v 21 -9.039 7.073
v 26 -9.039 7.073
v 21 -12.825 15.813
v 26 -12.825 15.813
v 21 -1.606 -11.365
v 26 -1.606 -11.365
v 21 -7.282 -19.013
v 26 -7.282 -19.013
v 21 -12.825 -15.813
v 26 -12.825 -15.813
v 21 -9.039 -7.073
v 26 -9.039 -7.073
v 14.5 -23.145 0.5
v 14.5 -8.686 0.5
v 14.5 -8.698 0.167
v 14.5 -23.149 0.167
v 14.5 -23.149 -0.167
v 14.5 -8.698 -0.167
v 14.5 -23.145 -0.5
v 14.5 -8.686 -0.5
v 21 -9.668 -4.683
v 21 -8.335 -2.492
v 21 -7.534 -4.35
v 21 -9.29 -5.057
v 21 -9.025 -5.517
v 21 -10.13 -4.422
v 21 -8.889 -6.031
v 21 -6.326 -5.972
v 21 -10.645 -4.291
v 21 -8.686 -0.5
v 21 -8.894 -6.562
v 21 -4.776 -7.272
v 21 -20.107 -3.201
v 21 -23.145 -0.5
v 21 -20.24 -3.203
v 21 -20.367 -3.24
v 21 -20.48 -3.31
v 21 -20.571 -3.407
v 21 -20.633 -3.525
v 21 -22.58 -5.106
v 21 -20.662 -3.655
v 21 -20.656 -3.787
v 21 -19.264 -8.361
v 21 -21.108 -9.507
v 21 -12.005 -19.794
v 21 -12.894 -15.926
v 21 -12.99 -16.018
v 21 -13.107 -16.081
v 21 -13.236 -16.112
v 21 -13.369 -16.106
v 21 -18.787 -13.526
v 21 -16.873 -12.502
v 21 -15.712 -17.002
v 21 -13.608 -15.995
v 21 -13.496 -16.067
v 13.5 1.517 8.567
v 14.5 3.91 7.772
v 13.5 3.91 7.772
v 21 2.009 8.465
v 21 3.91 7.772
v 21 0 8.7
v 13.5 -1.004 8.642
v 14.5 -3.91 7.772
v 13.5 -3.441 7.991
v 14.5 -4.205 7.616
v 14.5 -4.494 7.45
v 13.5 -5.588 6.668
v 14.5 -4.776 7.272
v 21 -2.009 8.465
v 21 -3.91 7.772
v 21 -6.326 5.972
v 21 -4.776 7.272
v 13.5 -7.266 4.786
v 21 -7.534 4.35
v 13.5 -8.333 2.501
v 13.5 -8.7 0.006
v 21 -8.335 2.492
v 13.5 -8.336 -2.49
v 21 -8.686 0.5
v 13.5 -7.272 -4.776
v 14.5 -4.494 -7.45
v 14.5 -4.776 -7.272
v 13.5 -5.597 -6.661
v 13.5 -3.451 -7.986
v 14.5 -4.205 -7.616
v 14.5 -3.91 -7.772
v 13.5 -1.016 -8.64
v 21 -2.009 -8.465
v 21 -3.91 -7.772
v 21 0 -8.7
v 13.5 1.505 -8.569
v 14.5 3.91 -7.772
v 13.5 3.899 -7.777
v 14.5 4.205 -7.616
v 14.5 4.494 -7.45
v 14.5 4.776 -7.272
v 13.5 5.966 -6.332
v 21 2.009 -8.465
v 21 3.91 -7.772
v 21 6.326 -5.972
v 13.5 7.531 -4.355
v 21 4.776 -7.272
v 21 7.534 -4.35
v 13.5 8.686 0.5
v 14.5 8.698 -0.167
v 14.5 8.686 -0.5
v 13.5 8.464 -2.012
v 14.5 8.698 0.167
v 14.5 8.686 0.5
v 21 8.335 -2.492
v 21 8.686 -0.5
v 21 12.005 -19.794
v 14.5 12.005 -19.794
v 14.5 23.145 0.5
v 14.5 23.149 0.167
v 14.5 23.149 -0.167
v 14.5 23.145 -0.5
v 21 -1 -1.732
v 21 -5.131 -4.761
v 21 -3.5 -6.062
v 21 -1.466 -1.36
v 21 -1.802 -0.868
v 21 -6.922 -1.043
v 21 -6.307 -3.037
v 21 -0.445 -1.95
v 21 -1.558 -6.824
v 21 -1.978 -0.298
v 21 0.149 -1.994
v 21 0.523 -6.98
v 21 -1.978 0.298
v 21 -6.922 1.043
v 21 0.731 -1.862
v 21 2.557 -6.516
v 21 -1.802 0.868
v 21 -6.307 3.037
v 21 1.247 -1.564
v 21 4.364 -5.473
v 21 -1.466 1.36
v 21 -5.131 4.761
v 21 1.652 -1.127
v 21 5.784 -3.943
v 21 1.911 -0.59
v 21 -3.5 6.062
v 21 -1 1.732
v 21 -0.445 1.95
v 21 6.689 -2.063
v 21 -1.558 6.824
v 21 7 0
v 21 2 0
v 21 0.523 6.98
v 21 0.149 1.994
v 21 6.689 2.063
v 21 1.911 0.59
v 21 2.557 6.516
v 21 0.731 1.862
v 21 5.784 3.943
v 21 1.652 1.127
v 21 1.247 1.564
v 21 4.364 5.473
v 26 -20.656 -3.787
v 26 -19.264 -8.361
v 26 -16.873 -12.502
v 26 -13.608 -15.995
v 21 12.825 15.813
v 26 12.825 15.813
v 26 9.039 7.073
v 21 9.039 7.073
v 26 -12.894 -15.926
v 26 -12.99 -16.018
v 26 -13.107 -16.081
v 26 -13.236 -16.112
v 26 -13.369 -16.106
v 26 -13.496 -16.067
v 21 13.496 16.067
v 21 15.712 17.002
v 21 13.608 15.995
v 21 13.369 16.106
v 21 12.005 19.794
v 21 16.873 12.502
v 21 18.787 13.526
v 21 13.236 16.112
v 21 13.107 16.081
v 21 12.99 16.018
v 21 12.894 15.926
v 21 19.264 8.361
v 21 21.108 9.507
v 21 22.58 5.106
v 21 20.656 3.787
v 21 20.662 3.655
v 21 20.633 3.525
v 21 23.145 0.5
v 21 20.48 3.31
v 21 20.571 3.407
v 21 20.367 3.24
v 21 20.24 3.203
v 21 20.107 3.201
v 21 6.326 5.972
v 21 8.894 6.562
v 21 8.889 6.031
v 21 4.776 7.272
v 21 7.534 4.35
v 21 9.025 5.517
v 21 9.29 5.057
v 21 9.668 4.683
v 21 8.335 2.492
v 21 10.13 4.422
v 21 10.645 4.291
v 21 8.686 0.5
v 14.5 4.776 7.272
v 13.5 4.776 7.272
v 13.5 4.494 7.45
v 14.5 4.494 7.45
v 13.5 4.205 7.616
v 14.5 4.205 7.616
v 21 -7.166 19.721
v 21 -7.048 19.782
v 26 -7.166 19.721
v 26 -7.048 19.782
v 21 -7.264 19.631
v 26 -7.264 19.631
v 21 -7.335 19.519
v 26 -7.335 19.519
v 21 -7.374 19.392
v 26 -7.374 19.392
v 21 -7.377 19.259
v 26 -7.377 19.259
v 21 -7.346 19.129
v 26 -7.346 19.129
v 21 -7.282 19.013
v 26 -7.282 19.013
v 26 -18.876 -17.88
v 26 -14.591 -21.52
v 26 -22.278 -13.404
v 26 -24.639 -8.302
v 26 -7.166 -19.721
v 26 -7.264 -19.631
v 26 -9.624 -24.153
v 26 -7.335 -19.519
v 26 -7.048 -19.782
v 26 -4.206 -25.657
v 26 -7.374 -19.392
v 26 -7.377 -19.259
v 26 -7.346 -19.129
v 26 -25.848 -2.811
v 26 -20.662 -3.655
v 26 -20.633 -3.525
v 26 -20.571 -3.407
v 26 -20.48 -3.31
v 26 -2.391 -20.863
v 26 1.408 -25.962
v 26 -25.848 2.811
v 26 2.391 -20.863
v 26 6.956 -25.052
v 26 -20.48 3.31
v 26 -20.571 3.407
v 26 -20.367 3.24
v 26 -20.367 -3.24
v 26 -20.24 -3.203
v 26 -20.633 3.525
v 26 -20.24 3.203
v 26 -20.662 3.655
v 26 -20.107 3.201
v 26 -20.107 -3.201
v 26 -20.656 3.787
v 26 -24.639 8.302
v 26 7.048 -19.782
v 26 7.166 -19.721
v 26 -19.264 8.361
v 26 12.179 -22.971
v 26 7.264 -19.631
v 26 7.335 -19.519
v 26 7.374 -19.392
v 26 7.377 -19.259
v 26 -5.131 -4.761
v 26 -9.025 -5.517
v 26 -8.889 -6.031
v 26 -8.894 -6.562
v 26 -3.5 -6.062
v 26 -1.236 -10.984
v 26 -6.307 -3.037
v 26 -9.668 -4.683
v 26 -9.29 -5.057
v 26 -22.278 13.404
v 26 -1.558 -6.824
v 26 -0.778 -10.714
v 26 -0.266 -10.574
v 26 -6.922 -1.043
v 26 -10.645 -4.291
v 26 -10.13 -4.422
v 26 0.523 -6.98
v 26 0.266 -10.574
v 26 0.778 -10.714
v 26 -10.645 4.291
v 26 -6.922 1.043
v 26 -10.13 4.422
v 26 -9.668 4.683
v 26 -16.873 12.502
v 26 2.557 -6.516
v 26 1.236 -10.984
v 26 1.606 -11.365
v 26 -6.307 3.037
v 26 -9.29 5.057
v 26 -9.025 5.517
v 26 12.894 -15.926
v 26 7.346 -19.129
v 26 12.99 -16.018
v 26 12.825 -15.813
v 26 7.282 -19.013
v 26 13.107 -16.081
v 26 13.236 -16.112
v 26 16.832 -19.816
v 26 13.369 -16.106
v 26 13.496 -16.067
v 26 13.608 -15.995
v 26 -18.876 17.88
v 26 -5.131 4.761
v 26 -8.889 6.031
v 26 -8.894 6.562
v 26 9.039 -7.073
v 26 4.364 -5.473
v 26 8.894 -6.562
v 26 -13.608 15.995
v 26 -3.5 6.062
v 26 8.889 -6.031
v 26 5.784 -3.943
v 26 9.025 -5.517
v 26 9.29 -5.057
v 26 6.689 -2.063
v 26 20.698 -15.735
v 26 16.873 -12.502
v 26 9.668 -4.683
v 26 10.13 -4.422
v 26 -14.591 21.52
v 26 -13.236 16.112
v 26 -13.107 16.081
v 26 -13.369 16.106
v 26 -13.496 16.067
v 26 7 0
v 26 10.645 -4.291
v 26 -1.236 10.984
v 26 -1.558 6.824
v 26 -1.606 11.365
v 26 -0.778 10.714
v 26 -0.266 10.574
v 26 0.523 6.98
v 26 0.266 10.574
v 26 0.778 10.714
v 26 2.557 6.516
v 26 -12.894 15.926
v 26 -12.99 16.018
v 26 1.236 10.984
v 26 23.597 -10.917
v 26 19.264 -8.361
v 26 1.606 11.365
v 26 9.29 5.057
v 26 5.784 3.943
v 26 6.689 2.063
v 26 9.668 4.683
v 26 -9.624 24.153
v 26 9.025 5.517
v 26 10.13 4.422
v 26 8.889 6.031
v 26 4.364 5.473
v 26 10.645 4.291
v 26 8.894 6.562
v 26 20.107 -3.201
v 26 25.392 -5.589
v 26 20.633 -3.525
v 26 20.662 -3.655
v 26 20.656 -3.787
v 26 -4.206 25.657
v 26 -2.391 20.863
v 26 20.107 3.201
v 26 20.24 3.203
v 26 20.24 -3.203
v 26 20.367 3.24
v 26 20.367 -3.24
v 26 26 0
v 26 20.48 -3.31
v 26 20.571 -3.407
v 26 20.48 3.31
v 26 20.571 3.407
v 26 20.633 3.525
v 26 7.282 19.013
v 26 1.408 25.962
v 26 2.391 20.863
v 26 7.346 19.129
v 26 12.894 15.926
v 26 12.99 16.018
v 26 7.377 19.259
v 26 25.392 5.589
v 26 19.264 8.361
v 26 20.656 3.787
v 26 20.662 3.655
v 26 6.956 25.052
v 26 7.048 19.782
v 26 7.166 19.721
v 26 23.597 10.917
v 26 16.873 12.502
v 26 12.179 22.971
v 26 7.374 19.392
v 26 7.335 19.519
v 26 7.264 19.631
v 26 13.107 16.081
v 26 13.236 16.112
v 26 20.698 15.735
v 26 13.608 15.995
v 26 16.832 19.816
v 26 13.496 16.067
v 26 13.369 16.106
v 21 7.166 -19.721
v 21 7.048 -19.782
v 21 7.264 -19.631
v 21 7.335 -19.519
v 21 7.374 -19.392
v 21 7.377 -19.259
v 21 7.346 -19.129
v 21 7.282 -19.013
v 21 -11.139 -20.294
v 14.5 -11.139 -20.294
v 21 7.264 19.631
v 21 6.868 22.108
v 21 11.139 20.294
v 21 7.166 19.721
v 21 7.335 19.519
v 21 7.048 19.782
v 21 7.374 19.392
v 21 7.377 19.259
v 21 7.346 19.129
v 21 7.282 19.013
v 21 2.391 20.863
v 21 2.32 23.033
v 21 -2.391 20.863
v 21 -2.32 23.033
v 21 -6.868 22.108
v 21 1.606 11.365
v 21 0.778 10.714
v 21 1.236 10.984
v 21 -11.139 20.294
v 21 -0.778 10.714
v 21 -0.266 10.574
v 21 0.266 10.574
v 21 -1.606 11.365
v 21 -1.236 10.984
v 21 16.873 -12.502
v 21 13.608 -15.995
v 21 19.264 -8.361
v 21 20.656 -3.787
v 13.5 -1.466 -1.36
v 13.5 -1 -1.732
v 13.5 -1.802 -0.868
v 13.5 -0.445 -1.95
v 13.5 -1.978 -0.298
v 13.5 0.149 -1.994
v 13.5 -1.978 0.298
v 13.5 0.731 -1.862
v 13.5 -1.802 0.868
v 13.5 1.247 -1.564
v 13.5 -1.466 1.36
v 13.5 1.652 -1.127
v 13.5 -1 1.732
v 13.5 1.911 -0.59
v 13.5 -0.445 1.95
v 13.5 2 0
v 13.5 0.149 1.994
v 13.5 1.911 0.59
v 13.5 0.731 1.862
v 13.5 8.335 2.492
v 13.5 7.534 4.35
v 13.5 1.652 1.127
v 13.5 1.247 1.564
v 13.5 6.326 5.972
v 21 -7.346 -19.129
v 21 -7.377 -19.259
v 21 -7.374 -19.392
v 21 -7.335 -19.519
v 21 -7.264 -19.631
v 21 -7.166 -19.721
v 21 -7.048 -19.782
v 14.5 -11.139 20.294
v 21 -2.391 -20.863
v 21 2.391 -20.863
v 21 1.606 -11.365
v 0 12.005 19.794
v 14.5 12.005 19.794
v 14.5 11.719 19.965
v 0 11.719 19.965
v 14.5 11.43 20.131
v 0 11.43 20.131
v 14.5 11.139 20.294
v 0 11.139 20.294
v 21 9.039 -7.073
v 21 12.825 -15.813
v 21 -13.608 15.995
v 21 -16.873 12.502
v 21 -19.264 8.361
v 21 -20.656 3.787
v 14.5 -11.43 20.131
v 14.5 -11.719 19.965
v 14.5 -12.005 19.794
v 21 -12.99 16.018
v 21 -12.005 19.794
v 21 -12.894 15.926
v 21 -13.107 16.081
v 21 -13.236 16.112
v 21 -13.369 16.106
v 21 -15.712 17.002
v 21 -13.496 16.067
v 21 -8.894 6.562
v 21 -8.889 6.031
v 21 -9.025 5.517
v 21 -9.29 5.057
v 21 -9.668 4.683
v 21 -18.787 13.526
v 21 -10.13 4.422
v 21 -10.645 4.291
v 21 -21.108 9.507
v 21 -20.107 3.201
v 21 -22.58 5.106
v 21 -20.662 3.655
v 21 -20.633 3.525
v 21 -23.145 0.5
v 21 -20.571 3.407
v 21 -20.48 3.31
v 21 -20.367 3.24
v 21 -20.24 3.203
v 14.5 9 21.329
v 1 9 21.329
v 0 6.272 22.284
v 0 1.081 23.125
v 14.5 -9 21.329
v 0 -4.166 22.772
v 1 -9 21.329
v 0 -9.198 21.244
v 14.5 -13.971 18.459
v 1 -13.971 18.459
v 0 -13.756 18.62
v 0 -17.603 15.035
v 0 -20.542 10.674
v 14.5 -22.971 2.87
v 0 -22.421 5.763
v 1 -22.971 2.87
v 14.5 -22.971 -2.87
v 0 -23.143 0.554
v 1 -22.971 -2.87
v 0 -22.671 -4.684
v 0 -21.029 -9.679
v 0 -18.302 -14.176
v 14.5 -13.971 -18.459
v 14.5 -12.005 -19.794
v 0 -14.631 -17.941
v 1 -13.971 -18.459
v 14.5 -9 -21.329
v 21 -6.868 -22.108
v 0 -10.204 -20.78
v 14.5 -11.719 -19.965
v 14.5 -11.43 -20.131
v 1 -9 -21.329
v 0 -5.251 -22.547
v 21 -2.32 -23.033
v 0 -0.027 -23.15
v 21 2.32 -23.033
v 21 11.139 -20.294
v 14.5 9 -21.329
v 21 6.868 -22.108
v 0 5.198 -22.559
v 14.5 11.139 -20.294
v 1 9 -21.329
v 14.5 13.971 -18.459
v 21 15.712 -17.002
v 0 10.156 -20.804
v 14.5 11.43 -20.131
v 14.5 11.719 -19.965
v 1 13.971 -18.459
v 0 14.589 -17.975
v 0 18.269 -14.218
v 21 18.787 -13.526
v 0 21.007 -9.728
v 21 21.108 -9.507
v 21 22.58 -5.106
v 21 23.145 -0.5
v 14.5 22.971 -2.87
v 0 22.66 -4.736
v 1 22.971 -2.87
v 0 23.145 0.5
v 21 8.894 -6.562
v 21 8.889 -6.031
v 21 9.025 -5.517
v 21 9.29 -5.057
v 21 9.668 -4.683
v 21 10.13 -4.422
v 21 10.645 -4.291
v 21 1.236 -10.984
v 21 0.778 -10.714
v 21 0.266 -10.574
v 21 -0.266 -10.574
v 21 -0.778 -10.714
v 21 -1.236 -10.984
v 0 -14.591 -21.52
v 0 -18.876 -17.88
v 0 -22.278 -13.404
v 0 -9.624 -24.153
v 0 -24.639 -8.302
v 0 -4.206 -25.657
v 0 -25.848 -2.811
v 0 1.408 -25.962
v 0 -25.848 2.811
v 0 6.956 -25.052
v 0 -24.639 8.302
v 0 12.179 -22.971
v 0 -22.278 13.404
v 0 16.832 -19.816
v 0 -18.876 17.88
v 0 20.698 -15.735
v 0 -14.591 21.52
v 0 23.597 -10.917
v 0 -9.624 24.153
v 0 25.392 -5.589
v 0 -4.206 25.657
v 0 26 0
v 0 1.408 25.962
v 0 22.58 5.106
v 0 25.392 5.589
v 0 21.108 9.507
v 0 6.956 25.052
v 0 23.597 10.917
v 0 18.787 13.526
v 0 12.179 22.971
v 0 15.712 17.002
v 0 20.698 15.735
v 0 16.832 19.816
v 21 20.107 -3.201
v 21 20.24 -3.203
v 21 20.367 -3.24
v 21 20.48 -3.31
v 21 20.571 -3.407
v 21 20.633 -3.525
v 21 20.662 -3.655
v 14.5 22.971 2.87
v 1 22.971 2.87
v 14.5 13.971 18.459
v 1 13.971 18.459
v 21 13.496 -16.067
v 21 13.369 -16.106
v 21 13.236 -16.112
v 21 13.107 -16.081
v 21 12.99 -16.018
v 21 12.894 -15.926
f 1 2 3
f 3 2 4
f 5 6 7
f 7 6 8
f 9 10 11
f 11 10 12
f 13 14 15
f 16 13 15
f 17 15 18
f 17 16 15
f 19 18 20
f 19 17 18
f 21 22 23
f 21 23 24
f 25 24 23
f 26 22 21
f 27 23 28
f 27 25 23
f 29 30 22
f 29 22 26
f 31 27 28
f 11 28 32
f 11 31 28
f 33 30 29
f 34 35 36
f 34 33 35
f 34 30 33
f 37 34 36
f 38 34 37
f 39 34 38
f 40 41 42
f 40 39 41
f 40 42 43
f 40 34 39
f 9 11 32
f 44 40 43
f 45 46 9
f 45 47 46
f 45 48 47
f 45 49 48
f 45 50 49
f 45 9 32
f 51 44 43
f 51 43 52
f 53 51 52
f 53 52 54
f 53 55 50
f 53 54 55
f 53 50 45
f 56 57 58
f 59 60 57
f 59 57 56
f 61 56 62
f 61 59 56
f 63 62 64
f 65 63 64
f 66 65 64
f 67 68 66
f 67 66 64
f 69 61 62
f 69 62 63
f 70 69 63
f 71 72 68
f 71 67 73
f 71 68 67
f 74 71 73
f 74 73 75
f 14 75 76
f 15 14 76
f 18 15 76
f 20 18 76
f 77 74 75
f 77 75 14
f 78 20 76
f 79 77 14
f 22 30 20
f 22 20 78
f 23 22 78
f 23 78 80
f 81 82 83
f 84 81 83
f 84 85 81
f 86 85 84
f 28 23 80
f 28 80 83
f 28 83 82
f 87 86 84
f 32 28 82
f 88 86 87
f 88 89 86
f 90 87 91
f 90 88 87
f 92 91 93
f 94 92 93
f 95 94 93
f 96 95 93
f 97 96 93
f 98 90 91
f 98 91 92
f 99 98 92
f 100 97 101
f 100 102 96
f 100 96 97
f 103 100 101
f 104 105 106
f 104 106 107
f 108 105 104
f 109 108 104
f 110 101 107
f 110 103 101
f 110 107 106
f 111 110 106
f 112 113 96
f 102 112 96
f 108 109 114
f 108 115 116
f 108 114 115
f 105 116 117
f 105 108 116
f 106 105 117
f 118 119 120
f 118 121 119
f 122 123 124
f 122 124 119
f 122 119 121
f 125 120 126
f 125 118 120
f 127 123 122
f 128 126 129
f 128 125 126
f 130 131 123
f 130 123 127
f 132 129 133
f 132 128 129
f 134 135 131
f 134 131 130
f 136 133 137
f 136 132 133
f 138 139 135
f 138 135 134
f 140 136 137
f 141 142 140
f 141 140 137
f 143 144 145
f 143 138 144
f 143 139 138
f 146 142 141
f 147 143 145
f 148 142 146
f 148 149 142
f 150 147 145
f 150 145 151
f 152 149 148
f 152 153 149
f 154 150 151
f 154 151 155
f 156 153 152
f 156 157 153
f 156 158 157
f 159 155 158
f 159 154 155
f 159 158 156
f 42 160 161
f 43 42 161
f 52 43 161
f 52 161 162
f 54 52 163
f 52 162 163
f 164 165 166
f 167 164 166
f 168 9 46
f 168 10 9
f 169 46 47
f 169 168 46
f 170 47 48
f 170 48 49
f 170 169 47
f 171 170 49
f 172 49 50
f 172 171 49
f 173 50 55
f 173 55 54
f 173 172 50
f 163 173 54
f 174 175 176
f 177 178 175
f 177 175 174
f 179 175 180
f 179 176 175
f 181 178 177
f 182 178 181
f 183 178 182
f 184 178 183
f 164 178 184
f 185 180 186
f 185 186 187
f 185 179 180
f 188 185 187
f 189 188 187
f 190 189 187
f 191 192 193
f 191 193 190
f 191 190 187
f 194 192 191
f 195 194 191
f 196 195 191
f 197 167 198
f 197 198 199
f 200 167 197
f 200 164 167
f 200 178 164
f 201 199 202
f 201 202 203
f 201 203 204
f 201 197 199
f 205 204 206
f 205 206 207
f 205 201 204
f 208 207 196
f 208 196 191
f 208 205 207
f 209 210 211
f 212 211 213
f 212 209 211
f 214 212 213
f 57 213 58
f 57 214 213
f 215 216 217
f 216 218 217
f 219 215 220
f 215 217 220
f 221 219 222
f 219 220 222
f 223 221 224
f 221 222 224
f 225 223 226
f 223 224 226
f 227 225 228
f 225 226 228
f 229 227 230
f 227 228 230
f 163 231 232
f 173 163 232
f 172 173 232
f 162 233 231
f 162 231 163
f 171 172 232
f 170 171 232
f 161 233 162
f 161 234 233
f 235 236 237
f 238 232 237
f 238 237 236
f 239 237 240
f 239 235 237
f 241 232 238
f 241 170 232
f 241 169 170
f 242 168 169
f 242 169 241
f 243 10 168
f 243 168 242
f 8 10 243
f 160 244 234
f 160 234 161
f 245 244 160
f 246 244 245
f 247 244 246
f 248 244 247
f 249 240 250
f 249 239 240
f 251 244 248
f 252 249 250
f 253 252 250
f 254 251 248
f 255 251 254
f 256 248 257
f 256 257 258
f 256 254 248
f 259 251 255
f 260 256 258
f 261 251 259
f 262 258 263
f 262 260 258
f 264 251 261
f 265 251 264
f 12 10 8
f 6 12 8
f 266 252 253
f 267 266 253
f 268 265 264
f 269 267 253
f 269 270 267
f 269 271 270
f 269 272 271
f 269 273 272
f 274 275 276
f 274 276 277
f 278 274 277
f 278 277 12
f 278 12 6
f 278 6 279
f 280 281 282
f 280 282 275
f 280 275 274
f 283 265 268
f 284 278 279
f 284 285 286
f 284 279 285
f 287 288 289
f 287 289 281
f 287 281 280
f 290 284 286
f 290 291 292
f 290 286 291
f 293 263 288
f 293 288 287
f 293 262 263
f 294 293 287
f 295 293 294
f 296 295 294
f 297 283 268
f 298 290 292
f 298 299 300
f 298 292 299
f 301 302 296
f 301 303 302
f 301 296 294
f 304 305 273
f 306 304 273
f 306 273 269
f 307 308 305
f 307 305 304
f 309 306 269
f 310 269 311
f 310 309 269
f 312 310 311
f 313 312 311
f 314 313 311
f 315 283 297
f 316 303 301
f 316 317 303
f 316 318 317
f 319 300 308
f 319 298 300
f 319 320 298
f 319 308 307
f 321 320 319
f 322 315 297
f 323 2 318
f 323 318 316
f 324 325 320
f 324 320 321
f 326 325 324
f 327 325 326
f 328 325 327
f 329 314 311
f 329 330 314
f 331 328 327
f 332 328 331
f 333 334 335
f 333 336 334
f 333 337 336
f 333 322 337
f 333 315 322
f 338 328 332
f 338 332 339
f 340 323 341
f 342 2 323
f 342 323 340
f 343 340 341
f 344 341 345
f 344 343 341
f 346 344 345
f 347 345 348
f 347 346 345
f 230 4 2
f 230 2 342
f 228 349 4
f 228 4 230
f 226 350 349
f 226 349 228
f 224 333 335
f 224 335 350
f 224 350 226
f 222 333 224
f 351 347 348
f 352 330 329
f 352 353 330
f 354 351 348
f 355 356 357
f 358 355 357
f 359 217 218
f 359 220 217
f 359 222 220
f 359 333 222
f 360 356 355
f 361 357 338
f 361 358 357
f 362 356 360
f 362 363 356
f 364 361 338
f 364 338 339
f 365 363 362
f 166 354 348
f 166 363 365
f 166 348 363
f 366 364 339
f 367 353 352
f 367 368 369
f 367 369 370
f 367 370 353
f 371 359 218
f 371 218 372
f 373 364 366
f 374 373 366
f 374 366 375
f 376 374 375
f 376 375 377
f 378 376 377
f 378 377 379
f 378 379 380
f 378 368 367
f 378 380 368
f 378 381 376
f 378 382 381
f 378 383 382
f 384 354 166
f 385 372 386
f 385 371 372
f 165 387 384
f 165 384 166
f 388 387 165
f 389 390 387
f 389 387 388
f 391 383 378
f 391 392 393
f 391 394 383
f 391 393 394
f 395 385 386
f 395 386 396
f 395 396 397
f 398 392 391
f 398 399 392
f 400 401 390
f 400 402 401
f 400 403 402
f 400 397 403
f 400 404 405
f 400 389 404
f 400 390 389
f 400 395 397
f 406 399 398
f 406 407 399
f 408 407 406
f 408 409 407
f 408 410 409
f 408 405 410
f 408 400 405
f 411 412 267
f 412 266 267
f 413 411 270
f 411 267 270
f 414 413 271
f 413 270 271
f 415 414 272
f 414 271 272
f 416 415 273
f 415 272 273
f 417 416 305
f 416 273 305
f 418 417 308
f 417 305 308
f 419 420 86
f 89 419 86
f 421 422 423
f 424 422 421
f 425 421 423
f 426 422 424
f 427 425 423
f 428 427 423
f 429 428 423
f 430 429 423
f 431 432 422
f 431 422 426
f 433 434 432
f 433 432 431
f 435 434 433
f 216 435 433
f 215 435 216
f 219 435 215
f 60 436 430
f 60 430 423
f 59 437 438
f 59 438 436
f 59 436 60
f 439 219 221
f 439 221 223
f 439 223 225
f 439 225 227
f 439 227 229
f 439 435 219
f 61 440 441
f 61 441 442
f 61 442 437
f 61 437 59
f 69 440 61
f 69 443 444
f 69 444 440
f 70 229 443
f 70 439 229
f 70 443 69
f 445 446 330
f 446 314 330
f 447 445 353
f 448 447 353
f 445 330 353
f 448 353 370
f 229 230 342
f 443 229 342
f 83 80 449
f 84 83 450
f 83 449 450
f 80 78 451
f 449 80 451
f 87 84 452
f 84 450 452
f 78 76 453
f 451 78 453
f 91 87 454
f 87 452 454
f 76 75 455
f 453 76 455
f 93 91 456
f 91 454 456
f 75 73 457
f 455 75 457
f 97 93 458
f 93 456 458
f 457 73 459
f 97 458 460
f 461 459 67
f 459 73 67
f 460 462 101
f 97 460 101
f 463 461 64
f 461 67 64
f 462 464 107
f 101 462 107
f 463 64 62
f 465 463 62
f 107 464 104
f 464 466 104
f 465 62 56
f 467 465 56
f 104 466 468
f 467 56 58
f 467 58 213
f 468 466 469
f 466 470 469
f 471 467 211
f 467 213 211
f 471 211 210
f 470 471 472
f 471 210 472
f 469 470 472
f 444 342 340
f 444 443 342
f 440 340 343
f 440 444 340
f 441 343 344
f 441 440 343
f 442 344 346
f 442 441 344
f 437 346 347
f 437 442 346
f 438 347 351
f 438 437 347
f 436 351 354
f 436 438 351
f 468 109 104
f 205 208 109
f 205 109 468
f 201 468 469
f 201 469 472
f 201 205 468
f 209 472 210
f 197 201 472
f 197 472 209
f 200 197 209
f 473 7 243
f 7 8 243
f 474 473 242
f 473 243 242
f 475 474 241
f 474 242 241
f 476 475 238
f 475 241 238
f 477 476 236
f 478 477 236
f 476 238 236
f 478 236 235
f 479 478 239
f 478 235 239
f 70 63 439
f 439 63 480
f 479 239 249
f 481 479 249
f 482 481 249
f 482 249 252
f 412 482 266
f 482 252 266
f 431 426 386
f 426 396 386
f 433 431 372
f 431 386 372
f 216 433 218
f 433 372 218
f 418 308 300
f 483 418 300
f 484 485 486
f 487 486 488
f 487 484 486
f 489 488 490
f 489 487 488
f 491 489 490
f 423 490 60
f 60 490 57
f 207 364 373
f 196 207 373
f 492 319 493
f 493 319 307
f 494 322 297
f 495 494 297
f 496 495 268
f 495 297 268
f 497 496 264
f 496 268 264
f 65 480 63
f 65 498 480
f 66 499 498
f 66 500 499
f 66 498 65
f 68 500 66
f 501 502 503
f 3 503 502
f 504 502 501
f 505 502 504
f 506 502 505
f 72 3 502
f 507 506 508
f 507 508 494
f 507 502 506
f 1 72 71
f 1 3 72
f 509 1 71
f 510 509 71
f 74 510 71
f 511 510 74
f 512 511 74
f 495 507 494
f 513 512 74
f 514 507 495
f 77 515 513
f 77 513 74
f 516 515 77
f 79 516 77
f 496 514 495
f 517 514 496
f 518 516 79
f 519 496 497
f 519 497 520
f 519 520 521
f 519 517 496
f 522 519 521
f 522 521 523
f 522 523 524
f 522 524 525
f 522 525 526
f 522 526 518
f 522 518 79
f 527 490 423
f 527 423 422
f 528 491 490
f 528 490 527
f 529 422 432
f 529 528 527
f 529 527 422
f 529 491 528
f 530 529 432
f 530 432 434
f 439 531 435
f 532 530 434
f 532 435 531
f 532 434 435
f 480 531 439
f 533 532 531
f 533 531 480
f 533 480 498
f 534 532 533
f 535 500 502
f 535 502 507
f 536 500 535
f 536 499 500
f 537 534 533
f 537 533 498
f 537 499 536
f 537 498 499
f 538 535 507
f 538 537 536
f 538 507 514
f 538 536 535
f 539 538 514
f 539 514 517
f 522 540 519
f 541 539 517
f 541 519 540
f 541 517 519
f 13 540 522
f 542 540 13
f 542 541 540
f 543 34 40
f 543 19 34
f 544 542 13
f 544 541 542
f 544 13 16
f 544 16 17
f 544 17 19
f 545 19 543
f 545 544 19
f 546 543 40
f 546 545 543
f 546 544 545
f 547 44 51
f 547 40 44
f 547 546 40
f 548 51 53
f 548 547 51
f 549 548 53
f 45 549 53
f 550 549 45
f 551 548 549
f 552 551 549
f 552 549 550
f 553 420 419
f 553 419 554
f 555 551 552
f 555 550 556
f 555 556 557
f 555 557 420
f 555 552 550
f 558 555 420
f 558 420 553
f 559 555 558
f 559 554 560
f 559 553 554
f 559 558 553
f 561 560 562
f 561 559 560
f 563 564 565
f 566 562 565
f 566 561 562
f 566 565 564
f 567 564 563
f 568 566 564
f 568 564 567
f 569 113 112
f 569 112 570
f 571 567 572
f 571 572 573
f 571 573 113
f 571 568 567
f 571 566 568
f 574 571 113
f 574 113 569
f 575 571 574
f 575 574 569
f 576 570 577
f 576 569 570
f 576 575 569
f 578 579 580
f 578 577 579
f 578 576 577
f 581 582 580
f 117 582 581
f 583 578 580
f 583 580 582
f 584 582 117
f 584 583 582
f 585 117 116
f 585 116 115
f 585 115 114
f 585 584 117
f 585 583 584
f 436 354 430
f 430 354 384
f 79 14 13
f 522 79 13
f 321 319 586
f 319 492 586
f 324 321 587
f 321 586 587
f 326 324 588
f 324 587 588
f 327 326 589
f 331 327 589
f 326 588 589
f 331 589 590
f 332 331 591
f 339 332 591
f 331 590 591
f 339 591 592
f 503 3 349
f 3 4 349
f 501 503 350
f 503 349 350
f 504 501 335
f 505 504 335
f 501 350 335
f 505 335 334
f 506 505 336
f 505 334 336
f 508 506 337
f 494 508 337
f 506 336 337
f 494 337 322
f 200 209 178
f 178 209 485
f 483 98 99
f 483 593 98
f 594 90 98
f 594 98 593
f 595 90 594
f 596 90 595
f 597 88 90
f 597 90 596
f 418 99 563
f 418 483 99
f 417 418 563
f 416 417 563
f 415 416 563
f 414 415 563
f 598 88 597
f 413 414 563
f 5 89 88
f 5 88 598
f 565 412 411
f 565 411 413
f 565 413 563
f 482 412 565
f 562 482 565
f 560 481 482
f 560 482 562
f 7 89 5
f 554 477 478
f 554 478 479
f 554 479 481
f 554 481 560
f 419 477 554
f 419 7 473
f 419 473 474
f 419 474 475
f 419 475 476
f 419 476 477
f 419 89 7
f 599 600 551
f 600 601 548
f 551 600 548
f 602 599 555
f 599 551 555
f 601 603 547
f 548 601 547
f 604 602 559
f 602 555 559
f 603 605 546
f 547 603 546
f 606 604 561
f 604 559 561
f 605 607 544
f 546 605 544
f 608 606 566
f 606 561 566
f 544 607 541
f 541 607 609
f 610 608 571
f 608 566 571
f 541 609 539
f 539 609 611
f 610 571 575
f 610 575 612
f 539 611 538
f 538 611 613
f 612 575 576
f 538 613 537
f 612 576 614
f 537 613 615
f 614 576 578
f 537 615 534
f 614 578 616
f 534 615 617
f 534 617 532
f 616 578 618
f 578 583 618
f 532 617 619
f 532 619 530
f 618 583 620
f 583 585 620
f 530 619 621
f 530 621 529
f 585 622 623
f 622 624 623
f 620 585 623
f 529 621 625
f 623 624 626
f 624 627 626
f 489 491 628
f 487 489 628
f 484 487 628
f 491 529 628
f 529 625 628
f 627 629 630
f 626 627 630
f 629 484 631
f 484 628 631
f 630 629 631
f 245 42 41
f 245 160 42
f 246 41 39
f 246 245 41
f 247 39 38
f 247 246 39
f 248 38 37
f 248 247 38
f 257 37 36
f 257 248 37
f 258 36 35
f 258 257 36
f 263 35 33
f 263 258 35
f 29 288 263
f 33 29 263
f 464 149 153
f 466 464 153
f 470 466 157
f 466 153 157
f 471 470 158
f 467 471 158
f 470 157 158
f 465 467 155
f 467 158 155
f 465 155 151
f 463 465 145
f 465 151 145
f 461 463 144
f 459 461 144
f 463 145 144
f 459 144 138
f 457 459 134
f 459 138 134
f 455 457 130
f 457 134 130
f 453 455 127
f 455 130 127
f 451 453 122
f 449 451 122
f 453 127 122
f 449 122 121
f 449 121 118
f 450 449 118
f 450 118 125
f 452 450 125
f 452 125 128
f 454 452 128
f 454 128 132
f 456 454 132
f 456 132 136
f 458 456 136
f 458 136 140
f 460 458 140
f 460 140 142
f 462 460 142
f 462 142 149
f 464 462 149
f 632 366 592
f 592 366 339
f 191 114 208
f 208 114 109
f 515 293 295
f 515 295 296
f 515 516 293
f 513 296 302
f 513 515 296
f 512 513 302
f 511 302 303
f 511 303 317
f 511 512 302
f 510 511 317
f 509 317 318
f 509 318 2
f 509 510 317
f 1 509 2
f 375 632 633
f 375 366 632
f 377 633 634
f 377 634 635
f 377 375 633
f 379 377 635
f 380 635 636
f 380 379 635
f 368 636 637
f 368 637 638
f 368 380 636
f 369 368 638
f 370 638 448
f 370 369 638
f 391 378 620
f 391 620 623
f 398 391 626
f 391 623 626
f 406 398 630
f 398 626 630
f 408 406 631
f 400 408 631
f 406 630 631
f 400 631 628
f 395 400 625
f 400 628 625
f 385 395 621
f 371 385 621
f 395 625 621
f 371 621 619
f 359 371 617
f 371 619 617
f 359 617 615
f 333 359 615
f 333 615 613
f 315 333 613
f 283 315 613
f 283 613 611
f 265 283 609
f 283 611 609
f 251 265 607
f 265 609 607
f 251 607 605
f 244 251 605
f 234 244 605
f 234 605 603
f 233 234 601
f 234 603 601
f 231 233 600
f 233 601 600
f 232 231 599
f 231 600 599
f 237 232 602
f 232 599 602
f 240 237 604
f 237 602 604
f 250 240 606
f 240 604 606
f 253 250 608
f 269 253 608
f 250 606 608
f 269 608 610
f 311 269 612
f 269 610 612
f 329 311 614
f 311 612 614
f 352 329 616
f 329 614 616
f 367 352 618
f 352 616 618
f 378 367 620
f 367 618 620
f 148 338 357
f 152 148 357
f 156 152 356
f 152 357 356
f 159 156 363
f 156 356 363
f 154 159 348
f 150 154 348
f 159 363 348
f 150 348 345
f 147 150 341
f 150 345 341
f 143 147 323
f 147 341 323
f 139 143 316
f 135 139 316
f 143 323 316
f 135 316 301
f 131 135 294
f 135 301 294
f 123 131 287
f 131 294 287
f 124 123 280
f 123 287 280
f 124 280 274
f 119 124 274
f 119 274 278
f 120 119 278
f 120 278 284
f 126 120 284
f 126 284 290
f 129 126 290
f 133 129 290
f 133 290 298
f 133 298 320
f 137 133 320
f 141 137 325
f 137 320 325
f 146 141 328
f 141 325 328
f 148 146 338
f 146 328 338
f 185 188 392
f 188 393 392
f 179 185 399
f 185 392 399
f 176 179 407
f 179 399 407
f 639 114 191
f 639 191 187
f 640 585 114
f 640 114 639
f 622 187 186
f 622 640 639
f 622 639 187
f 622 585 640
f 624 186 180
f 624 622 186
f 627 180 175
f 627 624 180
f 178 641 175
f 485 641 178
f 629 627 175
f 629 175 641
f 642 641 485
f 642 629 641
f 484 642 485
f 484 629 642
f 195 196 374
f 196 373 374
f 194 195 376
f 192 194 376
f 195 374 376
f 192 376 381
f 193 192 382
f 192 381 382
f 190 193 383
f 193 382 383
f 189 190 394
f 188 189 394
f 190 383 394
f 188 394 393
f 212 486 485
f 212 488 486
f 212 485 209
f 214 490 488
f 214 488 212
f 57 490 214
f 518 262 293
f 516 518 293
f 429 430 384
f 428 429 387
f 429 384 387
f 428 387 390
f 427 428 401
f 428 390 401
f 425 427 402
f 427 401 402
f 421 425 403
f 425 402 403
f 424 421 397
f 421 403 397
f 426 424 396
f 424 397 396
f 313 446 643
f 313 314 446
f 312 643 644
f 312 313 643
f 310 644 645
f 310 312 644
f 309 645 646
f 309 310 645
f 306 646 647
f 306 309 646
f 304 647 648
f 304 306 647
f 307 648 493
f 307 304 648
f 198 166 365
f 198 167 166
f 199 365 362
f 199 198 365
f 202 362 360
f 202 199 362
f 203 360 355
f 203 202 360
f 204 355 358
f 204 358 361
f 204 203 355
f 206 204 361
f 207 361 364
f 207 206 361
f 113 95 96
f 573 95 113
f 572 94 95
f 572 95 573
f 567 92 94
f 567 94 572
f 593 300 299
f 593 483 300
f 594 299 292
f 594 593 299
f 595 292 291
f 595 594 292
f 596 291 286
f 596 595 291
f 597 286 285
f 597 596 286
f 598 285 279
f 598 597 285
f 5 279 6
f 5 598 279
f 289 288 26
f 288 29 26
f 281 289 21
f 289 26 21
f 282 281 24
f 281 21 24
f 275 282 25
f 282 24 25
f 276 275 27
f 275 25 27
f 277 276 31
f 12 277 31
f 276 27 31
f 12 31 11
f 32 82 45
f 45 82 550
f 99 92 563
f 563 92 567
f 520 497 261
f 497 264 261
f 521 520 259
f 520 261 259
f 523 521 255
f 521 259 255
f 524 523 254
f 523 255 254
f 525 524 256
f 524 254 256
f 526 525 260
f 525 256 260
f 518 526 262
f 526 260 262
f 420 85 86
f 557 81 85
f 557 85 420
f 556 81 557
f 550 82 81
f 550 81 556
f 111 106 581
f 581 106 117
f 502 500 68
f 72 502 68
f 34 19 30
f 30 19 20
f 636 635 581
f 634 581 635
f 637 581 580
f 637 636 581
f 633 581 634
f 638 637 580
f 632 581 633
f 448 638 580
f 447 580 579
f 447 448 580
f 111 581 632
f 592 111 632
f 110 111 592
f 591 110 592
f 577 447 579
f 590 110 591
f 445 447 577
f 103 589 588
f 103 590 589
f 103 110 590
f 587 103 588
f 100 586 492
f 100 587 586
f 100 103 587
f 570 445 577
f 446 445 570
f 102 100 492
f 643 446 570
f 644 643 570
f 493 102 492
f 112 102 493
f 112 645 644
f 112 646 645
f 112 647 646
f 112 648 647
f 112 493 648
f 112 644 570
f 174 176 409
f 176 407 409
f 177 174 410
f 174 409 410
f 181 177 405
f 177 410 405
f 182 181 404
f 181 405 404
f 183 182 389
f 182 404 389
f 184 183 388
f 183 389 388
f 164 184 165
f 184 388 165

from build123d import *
from build123d import SkipClean  # not in build123d's __all__

# Parameters (mm, degrees)
F0_R      = 26
F1_DEPTH  = 26
F3_R      = 23.15
F4_DEPTH  = 21
F5_R      = 8.7
F6_DEPTH  = 12.5
F8_DEPTH  = 25
F9_R      = 7
F10_DEPTH = 5
F11_R     = 2
F12_DEPTH = 25
F13_W     = 5
F13_H     = 4.1104049385
F16_DEPTH = 25
F19_R     = 2
F20_R     = 0.5


with BuildPart() as f1:
    # F0 (on Right) → F1 (new body)
    with BuildSketch(Plane.YZ):
        Circle(F0_R)
    extrude(amount=F1_DEPTH)

    # F3 (on Right) → F4 (cut)
    with BuildSketch(Plane.YZ):
        Circle(F3_R)
    extrude(amount=F4_DEPTH, mode=Mode.SUBTRACT)

    # F5 (on offset) → F6 (join)
    with BuildSketch(Plane.YZ.offset(26)):
        Circle(F5_R)
    extrude(amount=-F6_DEPTH)

    # F7 (on offset) → F8 (cut)
    with BuildSketch(Plane.YZ.offset(26)):
        Polygon((-22.9713798889, 2.8702275171), (-7.9674337148, 4.6), (-13.9713798889, 18.4586847852), align=None)
        Polygon((-9, 21.3289123023), (0, 9.2), (9, 21.3289123023), align=None)
        Polygon((13.9713798889, 18.4586847852), (7.9674337148, 4.6), (22.9713798889, 2.8702275171), align=None)
        Polygon((22.9713798889, -2.8702275171), (7.9674337148, -4.6), (13.9713798889, -18.4586847852), align=None)
        Polygon((9, -21.3289123023), (0, -9.2), (-9, -21.3289123023), align=None)
        Polygon((-13.9713798889, -18.4586847852), (-7.9674337148, -4.6), (-22.9713798889, -2.8702275171), align=None)
    extrude(amount=-F8_DEPTH, mode=Mode.SUBTRACT)

    # F9 (on offset) → F10 (cut)
    with BuildSketch(Plane.YZ.offset(26)):
        Circle(F9_R)
    extrude(amount=-F10_DEPTH, mode=Mode.SUBTRACT)

    # F11 (on offset) → F12 (cut)
    with BuildSketch(Plane.YZ.offset(26)):
        Circle(F11_R)
    extrude(amount=-F12_DEPTH, mode=Mode.SUBTRACT)

    # F13 (on Front) → F14 (revolve)
    with BuildSketch(Plane.XZ):
        with Locations((23.5, 23.0552024692)):
            Rectangle(F13_W, F13_H)
    revolve(axis=Axis((13.1547623314, 0, 0), (1, 0, 0)))

    # F15 (on Right) → F16 (join)
    with BuildSketch(Plane.YZ):
        Polygon((12.9330127019, 21.4006350946), (12.5, 21.6506350946), (12.0669872981, 21.9006350946), (3.5669872981, 7.1782032303), (4.4330127019, 6.6782032303), align=None)
        Polygon((-3.5669872981, 7.1782032303), (-12.0669872981, 21.9006350946), (-12.5, 21.6506350946), (-12.9330127019, 21.4006350946), (-4.4330127019, 6.6782032303), align=None)
        Polygon((-8, 0.5), (-25, 0.5), (-25, 0), (-25, -0.5), (-8, -0.5), align=None)
        Polygon((-4.4330127019, -6.6782032303), (-12.9330127019, -21.4006350946), (-12.5, -21.6506350946), (-12.0669872981, -21.9006350946), (-3.5669872981, -7.1782032303), align=None)
        Polygon((3.5669872981, -7.1782032303), (12.0669872981, -21.9006350946), (12.5, -21.6506350946), (12.9330127019, -21.4006350946), (4.4330127019, -6.6782032303), align=None)
        Polygon((8, -0.5), (25, -0.5), (25, 0), (25, 0.5), (8, 0.5), align=None)
    extrude(amount=F16_DEPTH)

    # F17 (on Front) → F18 (revolve, cut)
    with BuildSketch(Plane.XZ):
        Polygon((14.5, 23.15), (-3.0704529053, 23.15), (-1.8057800443, 5.6787895144), (13.5, 5.6787895144), (13.5, 8.7), (14.5, 8.7), align=None)
    with SkipClean():  # cleaning this boolean's faces spoils the solid; the shape is the same uncleaned
        revolve(axis=Axis((9.9325310439, 0, 0), (1, 0, 0)), mode=Mode.SUBTRACT)

    # F19
    f19_edges = [f1.edges().sort_by_distance(p)[0] for p in [
        (23.5, -7.967434, 4.6),
        (23.5, 0, 9.2),
        (23.5, 7.967434, 4.6),
        (23.5, 7.967434, -4.6),
        (23.5, 0, -9.2),
        (23.5, -7.967434, -4.6),
    ]]
    fillet(f19_edges, radius=F19_R)

    # F20
    f20_edges = [f1.edges().sort_by_distance(p)[0] for p in [
        (23.5, 20.766266, -3.12445),
        (23.5, 13.088986, -16.421889),
        (23.5, 20.766266, 3.12445),
        (23.5, 13.088986, 16.421889),
        (23.5, 7.67728, -19.546339),
        (23.5, 7.67728, 19.546339),
        (23.5, -7.67728, 19.546339),
        (23.5, -13.088986, 16.421889),
        (23.5, -20.766266, 3.12445),
        (23.5, -20.766266, -3.12445),
        (23.5, -13.088986, -16.421889),
        (23.5, -7.67728, -19.546339),
    ]]
    fillet(f20_edges, radius=F20_R)


solid = f1.part
